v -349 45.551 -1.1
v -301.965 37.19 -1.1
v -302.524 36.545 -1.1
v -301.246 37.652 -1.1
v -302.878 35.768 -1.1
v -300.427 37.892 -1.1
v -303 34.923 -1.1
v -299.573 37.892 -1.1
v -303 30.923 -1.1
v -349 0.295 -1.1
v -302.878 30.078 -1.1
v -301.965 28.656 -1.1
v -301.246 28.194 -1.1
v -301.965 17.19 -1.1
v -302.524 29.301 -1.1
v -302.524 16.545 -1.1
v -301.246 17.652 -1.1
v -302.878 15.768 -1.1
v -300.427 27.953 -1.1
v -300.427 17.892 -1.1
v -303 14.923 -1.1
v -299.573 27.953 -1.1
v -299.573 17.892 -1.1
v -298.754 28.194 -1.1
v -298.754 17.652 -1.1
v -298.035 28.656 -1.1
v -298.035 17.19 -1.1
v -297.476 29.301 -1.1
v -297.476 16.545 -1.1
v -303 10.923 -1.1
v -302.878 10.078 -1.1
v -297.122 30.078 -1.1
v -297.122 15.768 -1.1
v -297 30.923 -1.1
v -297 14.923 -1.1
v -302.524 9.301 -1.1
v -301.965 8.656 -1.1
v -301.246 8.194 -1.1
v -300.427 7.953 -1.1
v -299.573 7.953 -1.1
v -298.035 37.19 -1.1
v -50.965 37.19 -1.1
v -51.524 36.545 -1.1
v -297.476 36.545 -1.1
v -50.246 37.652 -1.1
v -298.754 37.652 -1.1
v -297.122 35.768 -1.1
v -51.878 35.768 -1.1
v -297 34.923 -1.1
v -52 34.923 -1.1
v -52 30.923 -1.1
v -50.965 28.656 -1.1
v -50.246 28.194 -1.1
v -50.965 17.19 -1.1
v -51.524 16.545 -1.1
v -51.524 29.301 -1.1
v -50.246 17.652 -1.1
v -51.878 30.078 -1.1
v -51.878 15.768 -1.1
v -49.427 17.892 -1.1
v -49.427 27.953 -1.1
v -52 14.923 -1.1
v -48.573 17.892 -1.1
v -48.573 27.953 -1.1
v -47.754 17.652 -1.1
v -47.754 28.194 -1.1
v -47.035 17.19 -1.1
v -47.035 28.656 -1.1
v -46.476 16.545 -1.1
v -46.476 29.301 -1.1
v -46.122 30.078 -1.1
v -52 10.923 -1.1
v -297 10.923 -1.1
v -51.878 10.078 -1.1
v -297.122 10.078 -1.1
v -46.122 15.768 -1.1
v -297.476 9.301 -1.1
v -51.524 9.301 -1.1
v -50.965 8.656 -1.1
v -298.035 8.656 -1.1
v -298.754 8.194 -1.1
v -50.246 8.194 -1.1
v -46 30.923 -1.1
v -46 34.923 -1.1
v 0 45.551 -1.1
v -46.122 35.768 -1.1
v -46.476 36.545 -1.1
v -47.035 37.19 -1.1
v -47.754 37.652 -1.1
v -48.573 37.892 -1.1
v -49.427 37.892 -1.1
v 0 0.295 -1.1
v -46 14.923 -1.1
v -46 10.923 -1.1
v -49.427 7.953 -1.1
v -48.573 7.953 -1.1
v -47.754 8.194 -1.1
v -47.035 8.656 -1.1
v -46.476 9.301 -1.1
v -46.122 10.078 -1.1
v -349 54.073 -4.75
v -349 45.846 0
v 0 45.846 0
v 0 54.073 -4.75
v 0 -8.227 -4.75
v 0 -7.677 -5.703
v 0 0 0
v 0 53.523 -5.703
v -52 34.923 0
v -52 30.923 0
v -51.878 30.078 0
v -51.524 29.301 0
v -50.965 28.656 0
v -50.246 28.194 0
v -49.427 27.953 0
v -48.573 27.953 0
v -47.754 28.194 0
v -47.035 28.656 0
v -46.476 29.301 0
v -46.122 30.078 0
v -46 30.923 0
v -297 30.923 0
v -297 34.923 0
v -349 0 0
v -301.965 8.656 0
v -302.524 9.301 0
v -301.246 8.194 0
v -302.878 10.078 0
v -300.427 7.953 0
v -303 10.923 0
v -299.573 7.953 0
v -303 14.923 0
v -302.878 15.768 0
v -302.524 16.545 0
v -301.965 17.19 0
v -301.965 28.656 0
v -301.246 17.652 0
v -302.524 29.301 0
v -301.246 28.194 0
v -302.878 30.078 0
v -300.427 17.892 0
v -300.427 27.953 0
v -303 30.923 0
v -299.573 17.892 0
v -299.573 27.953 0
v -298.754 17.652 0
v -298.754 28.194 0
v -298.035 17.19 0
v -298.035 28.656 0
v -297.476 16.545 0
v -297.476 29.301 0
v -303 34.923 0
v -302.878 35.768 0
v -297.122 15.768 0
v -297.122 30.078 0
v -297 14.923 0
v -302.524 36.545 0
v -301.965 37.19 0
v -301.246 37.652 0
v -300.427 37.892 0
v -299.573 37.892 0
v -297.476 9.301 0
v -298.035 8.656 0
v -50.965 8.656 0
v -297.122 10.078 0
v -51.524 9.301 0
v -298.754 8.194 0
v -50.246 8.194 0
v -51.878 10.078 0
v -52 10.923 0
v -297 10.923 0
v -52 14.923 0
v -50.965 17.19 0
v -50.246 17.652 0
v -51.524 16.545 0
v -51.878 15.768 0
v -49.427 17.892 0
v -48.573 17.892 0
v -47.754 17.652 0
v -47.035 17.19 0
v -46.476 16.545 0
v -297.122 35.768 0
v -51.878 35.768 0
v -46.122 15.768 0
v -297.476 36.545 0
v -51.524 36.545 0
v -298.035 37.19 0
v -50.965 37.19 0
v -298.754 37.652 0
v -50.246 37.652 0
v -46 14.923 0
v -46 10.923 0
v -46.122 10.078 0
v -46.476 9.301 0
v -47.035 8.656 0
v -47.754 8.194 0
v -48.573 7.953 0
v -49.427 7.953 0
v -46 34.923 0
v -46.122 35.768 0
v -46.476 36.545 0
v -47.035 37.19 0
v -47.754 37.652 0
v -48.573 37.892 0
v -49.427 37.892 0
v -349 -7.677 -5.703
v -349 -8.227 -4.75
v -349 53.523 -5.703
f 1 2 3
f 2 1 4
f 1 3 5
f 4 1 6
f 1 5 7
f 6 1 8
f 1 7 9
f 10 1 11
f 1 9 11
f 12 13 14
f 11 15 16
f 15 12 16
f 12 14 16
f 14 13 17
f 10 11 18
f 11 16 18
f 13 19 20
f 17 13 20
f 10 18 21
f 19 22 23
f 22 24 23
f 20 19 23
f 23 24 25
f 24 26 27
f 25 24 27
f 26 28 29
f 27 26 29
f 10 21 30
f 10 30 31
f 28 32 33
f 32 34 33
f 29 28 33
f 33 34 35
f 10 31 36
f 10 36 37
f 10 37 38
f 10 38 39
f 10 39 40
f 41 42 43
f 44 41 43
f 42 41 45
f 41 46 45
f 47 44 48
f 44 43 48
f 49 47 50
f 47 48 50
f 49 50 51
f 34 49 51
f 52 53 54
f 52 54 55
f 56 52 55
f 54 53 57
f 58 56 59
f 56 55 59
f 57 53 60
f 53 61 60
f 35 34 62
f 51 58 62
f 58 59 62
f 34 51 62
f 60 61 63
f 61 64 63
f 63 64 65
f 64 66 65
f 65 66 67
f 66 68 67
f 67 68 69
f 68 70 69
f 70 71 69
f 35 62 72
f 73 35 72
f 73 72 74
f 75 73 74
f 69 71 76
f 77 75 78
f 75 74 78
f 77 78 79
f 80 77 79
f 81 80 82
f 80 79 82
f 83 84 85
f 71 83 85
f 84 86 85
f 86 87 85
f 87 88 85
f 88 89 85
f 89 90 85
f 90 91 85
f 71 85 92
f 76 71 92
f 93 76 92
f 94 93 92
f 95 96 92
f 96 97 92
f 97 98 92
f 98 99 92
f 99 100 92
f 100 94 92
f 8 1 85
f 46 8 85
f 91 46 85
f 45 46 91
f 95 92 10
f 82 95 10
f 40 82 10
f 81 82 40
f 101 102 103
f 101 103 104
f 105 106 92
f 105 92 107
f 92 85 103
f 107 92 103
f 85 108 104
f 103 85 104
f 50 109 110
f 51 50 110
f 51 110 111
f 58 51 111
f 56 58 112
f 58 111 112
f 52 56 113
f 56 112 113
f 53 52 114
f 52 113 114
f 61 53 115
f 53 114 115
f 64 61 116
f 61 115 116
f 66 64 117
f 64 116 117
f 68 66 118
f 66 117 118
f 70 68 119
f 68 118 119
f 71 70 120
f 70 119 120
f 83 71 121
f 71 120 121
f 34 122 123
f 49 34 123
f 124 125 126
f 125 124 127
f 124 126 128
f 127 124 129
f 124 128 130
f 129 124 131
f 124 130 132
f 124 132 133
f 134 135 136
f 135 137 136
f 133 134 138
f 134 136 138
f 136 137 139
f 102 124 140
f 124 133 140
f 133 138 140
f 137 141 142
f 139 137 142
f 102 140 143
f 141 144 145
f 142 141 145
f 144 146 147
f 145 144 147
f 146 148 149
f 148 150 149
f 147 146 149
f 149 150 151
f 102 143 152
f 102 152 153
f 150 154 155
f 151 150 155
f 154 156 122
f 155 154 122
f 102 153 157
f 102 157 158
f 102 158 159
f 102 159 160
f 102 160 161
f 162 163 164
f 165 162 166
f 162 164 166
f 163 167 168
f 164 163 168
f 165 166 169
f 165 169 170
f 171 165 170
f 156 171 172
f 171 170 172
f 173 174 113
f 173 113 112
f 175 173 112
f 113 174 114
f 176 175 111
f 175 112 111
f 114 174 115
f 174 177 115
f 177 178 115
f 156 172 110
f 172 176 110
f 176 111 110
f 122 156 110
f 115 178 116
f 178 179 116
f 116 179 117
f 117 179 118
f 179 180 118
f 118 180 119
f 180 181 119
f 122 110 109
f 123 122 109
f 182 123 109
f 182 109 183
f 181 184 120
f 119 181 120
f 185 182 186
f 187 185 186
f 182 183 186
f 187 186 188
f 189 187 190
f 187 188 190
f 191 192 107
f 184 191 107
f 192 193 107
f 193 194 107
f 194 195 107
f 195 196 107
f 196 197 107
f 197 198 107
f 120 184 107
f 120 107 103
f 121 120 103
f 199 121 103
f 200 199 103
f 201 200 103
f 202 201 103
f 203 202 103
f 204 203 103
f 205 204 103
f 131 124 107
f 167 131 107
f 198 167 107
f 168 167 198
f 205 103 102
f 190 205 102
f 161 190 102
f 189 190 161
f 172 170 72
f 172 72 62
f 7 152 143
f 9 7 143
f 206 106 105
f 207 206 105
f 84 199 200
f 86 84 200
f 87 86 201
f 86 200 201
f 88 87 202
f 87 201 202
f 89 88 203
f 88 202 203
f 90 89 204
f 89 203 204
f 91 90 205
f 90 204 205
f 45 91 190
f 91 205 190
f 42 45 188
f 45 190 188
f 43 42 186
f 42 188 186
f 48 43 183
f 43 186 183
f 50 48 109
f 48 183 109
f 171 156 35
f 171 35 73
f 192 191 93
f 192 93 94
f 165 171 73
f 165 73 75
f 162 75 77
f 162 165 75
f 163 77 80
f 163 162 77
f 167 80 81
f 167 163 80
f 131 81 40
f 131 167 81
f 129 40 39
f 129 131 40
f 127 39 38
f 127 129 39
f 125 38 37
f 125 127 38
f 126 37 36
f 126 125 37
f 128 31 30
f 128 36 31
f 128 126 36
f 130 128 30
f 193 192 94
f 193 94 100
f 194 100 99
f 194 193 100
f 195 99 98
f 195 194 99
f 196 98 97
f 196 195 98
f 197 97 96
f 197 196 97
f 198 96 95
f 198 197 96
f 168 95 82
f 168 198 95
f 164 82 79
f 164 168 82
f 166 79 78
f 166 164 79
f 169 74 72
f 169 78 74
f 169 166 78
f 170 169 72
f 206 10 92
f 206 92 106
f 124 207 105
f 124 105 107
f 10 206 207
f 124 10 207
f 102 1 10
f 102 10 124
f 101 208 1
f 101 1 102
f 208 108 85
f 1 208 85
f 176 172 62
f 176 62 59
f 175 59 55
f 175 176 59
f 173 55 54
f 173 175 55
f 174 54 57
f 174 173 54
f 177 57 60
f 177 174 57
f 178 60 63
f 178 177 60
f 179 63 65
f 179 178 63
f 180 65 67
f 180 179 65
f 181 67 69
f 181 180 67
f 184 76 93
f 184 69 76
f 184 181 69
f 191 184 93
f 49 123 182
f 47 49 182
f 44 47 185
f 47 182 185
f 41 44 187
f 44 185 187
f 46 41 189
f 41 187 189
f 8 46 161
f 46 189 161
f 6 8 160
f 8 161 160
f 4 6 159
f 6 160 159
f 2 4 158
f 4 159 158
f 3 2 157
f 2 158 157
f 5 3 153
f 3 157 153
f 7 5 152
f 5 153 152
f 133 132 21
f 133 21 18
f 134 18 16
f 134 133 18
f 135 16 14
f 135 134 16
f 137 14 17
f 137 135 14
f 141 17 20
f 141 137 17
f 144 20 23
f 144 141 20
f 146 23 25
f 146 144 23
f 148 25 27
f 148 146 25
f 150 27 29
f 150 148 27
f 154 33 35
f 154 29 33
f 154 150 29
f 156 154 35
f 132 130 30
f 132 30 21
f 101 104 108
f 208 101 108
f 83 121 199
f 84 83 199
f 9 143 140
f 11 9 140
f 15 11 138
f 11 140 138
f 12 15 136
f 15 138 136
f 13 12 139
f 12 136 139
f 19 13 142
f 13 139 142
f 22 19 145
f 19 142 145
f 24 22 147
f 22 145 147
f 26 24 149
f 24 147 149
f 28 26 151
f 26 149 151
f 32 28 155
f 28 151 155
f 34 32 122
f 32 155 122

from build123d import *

# Parameters (mm, degrees)
SM_BASE_FLANGE_2_DEPTH        = 349
CUT_EXTRUDE_1_DEPTH           = 10
PATTERN_LINEAR_1_COUNT        = 2
PATTERN_LINEAR_1_PITCH        = 251
PATTERN_LINEAR_1_COPY_1_DEPTH = 10


# Sheet-metal steps are written as plain solids
with BuildPart() as part:
    # 草图2 → 基体-法兰2 (new body)
    with BuildSketch(Plane(origin=(0, 0, 0), x_dir=(0, 0, -1), z_dir=(1, 0, 0))):
        Polygon((0, 0), (0, 45.845517328), (4.75, 54.072758664), (5.702627944, 53.522758664), (1.1, 45.550773216), (1.1, 0.294744112), (5.702627944, -7.677241336), (4.75, -8.227241336), align=None)
    extrude(amount=-SM_BASE_FLANGE_2_DEPTH)

    # 草图11 → 切除-拉伸1 (cut)
    with BuildSketch(Plane.XY):
        with BuildLine():
            Line((-46, 14.922758664), (-46, 10.922758664))
            ThreePointArc((-46, 10.922758664), (-49, 7.922758664), (-52, 10.922758664))
            Line((-52, 10.922758664), (-52, 14.922758664))
            ThreePointArc((-52, 14.922758664), (-49, 17.922758664), (-46, 14.922758664))
        make_face()
    cut_extrude_1 = extrude(amount=-CUT_EXTRUDE_1_DEPTH, mode=Mode.SUBTRACT)

    # 镜向1: 切除-拉伸1 across plane
    add(cut_extrude_1.mirror(Plane.ZX.offset(22.922758664)), mode=Mode.SUBTRACT)

    # 阵列(线性)1: 切除-拉伸1 ×2
    with Locations(*[(-i * PATTERN_LINEAR_1_PITCH, 0, 0) for i in range(1, PATTERN_LINEAR_1_COUNT)]):
        add(cut_extrude_1, mode=Mode.SUBTRACT)

    # 阵列(线性)1 copy 1 sketch → 阵列(线性)1 copy 1 (cut)
    with BuildSketch(Plane(origin=(-251, 45.845517328, 0), x_dir=(1, 0, 0), z_dir=(0, 0, 1))):
        with BuildLine():
            Line((-46, -14.922758664), (-46, -10.922758664))
            ThreePointArc((-46, -10.922758664), (-49, -7.922758664), (-52, -10.922758664))
            Line((-52, -10.922758664), (-52, -14.922758664))
            ThreePointArc((-52, -14.922758664), (-49, -17.922758664), (-46, -14.922758664))
        make_face()
    extrude(amount=-PATTERN_LINEAR_1_COPY_1_DEPTH, mode=Mode.SUBTRACT)


solid = part.part
